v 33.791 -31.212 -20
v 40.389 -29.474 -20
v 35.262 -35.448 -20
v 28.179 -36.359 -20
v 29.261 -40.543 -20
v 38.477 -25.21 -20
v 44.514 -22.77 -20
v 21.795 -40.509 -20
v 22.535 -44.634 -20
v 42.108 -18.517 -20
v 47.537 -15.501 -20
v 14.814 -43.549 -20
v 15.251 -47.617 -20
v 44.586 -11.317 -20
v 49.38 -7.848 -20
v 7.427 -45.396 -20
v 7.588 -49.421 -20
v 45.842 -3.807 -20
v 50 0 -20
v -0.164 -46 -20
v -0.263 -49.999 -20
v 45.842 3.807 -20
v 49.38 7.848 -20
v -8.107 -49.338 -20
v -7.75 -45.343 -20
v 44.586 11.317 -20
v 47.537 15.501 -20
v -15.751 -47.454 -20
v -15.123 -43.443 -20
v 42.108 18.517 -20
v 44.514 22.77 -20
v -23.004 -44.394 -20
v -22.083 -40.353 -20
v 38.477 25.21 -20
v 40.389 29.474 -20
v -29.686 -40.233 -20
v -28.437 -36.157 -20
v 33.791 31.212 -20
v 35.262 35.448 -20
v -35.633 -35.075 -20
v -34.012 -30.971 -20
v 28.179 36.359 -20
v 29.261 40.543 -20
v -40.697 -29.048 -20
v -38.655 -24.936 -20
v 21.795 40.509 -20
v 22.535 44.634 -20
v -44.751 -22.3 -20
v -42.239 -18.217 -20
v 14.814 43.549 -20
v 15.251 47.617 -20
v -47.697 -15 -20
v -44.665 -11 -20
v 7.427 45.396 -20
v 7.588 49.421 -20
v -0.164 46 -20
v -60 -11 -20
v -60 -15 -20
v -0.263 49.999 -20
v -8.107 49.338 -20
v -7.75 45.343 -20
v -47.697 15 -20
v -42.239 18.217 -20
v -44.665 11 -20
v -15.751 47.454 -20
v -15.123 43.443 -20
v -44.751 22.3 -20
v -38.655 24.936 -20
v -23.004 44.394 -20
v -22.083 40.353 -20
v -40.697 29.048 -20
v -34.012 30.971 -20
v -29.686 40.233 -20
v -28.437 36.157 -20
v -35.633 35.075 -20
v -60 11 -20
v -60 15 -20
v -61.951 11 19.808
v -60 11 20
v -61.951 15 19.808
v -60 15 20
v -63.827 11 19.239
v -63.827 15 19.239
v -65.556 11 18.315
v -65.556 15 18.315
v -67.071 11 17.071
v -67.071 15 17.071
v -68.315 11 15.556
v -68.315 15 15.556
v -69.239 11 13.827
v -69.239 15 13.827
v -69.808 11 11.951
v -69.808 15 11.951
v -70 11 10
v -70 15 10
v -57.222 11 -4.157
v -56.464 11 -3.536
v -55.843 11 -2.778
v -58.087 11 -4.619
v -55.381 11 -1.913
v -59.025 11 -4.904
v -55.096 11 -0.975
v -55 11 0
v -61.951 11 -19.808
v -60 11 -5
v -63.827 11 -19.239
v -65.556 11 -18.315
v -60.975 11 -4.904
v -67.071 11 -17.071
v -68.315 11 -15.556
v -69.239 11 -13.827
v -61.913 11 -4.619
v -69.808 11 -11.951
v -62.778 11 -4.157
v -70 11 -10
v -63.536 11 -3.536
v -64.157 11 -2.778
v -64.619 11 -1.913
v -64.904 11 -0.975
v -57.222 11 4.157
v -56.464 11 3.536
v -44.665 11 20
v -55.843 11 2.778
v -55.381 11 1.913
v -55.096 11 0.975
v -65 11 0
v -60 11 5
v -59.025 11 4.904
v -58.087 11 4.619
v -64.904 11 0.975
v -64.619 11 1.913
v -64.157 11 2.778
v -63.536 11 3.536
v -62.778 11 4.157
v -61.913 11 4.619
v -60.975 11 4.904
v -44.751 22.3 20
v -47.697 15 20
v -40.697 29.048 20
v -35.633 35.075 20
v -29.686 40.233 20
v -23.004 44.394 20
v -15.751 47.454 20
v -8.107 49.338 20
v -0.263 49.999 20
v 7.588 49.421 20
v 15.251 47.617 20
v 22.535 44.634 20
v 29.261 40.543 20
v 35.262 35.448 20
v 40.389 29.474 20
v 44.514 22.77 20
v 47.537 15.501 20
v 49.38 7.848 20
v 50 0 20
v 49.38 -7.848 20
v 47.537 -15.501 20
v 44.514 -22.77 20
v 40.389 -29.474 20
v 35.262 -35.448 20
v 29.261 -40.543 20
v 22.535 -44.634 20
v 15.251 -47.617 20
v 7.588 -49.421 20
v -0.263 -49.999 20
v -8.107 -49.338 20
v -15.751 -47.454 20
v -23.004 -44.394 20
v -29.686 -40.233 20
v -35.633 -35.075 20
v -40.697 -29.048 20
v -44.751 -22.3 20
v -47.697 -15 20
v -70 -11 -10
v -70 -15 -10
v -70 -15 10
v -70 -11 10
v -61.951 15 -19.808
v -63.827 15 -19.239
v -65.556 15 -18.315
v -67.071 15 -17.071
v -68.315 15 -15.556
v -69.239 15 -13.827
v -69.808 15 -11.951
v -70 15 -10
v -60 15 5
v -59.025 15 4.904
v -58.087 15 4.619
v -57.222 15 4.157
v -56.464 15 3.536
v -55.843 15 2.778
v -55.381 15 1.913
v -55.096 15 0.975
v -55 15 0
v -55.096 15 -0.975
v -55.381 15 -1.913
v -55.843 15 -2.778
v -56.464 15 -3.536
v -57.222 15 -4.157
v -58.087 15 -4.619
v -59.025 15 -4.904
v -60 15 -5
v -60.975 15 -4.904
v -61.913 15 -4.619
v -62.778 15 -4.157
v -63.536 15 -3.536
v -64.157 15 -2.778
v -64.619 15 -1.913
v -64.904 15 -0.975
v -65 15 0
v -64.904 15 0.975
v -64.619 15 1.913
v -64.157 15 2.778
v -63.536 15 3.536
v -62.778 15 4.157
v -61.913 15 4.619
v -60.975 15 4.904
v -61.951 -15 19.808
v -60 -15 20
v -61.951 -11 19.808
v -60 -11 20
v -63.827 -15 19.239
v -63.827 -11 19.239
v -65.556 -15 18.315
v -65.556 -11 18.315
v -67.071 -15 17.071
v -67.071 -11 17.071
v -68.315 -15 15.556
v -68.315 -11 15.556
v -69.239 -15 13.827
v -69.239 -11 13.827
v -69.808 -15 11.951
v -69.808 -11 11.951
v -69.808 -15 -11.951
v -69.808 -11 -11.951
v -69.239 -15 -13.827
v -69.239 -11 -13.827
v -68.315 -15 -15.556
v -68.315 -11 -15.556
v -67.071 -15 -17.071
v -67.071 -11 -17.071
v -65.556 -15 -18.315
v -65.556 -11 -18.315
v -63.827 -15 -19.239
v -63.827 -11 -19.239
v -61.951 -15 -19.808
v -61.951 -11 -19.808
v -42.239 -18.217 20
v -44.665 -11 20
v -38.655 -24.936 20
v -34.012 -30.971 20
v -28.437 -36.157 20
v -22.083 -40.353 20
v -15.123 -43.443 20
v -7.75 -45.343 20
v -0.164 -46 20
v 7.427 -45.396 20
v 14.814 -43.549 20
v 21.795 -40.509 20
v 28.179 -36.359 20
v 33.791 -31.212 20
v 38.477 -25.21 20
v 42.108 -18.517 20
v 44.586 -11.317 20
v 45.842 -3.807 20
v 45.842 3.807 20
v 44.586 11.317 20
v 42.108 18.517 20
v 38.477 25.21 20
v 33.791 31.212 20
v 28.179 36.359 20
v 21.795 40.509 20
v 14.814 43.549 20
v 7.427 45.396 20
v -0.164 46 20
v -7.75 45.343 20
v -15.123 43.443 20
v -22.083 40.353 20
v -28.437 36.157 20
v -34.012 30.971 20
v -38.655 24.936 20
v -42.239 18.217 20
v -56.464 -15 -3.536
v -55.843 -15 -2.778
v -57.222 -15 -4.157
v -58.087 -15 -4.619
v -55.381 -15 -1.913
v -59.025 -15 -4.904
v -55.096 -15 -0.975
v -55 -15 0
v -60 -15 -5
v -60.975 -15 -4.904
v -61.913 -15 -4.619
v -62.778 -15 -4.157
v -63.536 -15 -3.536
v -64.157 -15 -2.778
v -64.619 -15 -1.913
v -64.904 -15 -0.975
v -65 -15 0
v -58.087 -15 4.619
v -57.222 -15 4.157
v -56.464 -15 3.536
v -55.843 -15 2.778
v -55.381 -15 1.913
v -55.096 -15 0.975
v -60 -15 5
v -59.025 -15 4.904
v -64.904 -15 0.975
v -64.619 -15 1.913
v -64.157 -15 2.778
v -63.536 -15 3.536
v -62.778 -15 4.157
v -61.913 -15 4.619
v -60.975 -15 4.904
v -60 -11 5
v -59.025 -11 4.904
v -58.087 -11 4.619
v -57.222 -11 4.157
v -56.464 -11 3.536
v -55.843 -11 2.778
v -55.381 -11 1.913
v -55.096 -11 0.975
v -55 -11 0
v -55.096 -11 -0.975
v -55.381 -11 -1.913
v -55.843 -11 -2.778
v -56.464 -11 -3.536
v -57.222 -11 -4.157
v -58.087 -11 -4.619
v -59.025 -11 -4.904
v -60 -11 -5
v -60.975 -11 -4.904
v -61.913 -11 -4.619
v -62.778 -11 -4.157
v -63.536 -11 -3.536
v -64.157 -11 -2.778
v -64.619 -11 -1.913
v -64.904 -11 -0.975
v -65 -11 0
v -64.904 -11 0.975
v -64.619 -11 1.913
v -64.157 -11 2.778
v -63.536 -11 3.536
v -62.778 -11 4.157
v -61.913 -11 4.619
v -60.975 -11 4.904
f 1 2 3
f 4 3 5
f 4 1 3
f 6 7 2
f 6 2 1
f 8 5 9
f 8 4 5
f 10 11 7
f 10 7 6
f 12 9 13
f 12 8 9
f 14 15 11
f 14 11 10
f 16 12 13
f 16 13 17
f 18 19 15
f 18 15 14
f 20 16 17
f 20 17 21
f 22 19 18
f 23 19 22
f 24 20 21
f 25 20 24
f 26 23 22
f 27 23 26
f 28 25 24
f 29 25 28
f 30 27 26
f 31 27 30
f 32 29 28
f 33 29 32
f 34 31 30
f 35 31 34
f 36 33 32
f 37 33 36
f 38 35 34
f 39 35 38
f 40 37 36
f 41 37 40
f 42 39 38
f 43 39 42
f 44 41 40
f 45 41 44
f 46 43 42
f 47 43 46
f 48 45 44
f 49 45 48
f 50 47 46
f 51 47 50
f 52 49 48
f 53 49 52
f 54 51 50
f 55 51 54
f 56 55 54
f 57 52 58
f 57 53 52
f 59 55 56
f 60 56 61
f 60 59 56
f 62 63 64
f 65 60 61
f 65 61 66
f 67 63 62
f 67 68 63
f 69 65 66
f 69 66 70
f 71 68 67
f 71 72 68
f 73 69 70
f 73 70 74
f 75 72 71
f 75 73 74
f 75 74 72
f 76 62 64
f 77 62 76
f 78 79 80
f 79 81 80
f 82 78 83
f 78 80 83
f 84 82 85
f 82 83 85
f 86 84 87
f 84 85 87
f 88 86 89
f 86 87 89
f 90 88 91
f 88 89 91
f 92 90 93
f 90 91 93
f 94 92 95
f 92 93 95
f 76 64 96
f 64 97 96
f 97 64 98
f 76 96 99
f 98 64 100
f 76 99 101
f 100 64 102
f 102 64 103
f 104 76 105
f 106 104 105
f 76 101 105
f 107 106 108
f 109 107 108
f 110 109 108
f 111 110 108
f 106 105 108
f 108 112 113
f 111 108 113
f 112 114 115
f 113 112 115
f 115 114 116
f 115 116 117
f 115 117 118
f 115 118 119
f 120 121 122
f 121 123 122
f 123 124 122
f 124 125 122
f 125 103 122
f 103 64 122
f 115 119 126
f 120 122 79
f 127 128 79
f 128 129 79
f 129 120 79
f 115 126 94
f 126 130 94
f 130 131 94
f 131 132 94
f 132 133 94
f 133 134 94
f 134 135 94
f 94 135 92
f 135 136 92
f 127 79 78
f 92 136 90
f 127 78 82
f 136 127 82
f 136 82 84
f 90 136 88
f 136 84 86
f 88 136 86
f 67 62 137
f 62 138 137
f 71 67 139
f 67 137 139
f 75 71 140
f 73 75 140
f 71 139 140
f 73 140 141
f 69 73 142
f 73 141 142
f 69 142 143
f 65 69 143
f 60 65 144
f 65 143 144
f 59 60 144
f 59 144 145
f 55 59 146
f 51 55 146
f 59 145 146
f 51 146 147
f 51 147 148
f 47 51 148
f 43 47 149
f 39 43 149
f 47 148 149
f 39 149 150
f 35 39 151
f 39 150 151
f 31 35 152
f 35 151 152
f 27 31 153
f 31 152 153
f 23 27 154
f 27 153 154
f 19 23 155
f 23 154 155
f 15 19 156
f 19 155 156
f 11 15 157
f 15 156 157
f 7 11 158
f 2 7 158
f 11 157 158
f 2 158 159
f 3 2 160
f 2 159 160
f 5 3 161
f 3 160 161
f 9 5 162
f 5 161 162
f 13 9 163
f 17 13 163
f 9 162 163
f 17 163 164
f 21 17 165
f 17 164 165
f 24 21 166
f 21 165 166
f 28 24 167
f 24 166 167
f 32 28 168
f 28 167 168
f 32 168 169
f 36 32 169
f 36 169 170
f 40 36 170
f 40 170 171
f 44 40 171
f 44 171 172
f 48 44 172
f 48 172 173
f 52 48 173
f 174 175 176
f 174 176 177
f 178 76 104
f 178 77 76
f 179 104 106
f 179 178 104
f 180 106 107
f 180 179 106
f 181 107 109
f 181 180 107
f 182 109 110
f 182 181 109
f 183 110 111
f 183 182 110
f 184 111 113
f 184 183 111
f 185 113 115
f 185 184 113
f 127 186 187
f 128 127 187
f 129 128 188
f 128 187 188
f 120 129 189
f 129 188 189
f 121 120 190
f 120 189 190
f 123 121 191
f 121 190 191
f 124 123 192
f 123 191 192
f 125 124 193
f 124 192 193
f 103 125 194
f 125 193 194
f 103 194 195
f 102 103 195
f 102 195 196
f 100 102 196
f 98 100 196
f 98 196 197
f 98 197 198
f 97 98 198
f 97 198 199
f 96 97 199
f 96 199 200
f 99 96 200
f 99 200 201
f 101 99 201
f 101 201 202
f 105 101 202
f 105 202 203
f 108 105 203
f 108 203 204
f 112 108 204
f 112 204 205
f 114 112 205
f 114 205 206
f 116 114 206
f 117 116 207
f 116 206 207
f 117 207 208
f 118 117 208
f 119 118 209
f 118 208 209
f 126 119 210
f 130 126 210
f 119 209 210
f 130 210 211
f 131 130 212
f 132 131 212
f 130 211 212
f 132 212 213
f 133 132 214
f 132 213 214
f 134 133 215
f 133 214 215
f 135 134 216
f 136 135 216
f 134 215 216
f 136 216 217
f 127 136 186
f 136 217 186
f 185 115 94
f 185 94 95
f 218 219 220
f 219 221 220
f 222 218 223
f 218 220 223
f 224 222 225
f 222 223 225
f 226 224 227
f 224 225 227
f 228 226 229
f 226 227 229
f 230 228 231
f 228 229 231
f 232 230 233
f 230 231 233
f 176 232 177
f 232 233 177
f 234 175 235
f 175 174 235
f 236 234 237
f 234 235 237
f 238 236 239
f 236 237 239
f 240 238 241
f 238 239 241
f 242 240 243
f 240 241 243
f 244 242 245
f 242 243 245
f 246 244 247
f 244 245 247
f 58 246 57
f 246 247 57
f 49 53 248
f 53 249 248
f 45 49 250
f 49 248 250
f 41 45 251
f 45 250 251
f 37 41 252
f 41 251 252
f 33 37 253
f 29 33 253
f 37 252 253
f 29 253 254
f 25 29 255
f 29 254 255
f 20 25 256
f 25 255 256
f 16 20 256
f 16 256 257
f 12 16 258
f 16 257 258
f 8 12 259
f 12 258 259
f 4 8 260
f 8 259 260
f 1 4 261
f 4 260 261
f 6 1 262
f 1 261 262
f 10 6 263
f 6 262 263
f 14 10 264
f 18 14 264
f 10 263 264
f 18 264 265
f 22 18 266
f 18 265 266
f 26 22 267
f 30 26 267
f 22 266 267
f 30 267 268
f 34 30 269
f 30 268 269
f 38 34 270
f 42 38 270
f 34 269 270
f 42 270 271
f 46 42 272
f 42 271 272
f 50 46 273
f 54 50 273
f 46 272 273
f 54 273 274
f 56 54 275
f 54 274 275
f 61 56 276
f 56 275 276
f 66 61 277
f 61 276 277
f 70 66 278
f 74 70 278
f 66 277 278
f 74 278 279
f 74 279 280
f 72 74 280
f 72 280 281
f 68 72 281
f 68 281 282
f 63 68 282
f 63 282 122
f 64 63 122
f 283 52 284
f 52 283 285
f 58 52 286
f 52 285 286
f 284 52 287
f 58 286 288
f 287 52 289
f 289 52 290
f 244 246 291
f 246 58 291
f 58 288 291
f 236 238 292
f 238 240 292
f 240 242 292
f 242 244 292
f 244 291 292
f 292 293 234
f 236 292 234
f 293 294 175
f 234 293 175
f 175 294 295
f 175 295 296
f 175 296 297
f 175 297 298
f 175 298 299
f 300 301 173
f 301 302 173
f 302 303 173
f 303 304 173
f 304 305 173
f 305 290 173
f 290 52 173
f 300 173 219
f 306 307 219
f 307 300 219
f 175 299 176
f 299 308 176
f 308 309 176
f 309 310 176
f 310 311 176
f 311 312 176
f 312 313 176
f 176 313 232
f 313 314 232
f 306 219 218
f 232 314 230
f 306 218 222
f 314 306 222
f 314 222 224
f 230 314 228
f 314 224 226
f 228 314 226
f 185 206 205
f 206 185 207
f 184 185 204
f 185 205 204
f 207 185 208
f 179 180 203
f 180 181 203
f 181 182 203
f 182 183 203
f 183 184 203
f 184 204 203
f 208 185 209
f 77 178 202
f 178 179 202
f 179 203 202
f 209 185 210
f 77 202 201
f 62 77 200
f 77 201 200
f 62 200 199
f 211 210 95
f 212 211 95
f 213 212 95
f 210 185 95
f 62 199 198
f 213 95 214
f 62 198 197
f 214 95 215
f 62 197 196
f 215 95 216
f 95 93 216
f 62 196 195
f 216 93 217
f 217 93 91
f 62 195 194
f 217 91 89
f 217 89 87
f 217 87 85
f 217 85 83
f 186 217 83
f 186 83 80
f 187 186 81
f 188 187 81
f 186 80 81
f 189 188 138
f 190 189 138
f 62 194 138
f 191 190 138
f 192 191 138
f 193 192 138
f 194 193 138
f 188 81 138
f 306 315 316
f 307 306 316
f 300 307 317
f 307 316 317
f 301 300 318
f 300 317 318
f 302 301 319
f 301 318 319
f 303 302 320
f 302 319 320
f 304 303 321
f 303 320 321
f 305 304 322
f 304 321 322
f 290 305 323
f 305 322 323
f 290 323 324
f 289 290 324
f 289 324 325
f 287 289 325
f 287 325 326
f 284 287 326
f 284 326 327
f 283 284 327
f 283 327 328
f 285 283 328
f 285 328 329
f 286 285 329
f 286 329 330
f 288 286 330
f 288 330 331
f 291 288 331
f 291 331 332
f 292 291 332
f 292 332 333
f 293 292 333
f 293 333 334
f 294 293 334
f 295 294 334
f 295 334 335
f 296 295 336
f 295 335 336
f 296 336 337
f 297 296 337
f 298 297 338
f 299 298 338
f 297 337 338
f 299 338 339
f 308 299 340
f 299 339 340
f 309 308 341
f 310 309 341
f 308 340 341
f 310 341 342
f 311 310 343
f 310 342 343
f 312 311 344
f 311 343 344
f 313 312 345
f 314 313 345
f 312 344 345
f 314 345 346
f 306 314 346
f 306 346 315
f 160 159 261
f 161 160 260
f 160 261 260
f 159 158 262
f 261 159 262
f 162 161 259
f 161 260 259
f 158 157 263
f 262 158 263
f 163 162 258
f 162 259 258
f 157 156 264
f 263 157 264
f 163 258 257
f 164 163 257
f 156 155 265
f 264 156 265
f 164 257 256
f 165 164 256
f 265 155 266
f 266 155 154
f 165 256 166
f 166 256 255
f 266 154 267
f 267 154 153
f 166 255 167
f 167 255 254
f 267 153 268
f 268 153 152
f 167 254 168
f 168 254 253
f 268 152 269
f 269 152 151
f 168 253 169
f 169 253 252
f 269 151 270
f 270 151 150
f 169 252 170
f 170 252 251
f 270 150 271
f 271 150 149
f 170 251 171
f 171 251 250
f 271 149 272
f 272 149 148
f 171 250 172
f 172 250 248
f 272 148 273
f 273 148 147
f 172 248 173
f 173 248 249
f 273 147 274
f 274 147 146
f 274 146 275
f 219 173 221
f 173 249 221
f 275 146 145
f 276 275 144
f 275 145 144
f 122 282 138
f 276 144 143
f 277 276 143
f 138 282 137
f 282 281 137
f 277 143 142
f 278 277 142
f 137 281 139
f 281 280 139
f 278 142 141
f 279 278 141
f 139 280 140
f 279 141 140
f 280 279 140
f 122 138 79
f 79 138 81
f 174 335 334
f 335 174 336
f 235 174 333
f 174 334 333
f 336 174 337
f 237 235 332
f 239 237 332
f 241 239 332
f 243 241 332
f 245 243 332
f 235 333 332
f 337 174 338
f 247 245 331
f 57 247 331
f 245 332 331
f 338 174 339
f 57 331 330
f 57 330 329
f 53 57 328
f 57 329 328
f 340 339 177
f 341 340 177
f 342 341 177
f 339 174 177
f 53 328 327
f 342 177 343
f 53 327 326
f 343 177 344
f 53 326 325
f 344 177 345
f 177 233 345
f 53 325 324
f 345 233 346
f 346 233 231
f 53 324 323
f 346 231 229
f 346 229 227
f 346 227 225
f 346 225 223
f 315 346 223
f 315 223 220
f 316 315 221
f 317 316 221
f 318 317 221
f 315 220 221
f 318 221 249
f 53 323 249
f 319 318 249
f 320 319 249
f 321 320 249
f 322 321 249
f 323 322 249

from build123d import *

# Parameters (mm, degrees)
BOSS_EXTRUDE1_DEPTH = 20
FILLET1_R           = 10
SKETCH2_R           = 5
CUT_EXTRUDE1_DEPTH  = 40


with BuildPart() as part:
    # Sketch1 → Boss-Extrude1 (new, symmetric)
    with BuildSketch(Plane.XY):
        with BuildLine():
            Line((-70, 15), (-47.696960071, 15))
            ThreePointArc((-47.696960071, 15), (50, 0), (-47.696960071, -15))
            Line((-47.696960071, -15), (-70, -15))
            Line((-70, -15), (-70, -11))
            Line((-70, -11), (-44.665422868, -11))
            ThreePointArc((-44.665422868, -11), (46, 0), (-44.665422868, 11))
            Line((-44.665422868, 11), (-70, 11))
            Line((-70, 11), (-70, 15))
        make_face()
    extrude(amount=BOSS_EXTRUDE1_DEPTH, both=True)

    # Fillet1
    fillet1_edges = [part.edges().sort_by_distance(p)[0] for p in [
        (-70, -13, -20),
        (-70, 13, 20),
        (-70, -13, 20),
        (-70, 13, -20),
    ]]
    fillet(fillet1_edges, radius=FILLET1_R)

    # Sketch2 → Cut-Extrude1 (cut)
    with BuildSketch(Plane(origin=(0, 15, 0), x_dir=(1, 0, 0), z_dir=(0, 1, 0))):
        with Locations(Location((-60, 0, 0), (0, 0, 270))):
            Circle(SKETCH2_R)
    extrude(amount=-CUT_EXTRUDE1_DEPTH, mode=Mode.SUBTRACT)


solid = part.part
